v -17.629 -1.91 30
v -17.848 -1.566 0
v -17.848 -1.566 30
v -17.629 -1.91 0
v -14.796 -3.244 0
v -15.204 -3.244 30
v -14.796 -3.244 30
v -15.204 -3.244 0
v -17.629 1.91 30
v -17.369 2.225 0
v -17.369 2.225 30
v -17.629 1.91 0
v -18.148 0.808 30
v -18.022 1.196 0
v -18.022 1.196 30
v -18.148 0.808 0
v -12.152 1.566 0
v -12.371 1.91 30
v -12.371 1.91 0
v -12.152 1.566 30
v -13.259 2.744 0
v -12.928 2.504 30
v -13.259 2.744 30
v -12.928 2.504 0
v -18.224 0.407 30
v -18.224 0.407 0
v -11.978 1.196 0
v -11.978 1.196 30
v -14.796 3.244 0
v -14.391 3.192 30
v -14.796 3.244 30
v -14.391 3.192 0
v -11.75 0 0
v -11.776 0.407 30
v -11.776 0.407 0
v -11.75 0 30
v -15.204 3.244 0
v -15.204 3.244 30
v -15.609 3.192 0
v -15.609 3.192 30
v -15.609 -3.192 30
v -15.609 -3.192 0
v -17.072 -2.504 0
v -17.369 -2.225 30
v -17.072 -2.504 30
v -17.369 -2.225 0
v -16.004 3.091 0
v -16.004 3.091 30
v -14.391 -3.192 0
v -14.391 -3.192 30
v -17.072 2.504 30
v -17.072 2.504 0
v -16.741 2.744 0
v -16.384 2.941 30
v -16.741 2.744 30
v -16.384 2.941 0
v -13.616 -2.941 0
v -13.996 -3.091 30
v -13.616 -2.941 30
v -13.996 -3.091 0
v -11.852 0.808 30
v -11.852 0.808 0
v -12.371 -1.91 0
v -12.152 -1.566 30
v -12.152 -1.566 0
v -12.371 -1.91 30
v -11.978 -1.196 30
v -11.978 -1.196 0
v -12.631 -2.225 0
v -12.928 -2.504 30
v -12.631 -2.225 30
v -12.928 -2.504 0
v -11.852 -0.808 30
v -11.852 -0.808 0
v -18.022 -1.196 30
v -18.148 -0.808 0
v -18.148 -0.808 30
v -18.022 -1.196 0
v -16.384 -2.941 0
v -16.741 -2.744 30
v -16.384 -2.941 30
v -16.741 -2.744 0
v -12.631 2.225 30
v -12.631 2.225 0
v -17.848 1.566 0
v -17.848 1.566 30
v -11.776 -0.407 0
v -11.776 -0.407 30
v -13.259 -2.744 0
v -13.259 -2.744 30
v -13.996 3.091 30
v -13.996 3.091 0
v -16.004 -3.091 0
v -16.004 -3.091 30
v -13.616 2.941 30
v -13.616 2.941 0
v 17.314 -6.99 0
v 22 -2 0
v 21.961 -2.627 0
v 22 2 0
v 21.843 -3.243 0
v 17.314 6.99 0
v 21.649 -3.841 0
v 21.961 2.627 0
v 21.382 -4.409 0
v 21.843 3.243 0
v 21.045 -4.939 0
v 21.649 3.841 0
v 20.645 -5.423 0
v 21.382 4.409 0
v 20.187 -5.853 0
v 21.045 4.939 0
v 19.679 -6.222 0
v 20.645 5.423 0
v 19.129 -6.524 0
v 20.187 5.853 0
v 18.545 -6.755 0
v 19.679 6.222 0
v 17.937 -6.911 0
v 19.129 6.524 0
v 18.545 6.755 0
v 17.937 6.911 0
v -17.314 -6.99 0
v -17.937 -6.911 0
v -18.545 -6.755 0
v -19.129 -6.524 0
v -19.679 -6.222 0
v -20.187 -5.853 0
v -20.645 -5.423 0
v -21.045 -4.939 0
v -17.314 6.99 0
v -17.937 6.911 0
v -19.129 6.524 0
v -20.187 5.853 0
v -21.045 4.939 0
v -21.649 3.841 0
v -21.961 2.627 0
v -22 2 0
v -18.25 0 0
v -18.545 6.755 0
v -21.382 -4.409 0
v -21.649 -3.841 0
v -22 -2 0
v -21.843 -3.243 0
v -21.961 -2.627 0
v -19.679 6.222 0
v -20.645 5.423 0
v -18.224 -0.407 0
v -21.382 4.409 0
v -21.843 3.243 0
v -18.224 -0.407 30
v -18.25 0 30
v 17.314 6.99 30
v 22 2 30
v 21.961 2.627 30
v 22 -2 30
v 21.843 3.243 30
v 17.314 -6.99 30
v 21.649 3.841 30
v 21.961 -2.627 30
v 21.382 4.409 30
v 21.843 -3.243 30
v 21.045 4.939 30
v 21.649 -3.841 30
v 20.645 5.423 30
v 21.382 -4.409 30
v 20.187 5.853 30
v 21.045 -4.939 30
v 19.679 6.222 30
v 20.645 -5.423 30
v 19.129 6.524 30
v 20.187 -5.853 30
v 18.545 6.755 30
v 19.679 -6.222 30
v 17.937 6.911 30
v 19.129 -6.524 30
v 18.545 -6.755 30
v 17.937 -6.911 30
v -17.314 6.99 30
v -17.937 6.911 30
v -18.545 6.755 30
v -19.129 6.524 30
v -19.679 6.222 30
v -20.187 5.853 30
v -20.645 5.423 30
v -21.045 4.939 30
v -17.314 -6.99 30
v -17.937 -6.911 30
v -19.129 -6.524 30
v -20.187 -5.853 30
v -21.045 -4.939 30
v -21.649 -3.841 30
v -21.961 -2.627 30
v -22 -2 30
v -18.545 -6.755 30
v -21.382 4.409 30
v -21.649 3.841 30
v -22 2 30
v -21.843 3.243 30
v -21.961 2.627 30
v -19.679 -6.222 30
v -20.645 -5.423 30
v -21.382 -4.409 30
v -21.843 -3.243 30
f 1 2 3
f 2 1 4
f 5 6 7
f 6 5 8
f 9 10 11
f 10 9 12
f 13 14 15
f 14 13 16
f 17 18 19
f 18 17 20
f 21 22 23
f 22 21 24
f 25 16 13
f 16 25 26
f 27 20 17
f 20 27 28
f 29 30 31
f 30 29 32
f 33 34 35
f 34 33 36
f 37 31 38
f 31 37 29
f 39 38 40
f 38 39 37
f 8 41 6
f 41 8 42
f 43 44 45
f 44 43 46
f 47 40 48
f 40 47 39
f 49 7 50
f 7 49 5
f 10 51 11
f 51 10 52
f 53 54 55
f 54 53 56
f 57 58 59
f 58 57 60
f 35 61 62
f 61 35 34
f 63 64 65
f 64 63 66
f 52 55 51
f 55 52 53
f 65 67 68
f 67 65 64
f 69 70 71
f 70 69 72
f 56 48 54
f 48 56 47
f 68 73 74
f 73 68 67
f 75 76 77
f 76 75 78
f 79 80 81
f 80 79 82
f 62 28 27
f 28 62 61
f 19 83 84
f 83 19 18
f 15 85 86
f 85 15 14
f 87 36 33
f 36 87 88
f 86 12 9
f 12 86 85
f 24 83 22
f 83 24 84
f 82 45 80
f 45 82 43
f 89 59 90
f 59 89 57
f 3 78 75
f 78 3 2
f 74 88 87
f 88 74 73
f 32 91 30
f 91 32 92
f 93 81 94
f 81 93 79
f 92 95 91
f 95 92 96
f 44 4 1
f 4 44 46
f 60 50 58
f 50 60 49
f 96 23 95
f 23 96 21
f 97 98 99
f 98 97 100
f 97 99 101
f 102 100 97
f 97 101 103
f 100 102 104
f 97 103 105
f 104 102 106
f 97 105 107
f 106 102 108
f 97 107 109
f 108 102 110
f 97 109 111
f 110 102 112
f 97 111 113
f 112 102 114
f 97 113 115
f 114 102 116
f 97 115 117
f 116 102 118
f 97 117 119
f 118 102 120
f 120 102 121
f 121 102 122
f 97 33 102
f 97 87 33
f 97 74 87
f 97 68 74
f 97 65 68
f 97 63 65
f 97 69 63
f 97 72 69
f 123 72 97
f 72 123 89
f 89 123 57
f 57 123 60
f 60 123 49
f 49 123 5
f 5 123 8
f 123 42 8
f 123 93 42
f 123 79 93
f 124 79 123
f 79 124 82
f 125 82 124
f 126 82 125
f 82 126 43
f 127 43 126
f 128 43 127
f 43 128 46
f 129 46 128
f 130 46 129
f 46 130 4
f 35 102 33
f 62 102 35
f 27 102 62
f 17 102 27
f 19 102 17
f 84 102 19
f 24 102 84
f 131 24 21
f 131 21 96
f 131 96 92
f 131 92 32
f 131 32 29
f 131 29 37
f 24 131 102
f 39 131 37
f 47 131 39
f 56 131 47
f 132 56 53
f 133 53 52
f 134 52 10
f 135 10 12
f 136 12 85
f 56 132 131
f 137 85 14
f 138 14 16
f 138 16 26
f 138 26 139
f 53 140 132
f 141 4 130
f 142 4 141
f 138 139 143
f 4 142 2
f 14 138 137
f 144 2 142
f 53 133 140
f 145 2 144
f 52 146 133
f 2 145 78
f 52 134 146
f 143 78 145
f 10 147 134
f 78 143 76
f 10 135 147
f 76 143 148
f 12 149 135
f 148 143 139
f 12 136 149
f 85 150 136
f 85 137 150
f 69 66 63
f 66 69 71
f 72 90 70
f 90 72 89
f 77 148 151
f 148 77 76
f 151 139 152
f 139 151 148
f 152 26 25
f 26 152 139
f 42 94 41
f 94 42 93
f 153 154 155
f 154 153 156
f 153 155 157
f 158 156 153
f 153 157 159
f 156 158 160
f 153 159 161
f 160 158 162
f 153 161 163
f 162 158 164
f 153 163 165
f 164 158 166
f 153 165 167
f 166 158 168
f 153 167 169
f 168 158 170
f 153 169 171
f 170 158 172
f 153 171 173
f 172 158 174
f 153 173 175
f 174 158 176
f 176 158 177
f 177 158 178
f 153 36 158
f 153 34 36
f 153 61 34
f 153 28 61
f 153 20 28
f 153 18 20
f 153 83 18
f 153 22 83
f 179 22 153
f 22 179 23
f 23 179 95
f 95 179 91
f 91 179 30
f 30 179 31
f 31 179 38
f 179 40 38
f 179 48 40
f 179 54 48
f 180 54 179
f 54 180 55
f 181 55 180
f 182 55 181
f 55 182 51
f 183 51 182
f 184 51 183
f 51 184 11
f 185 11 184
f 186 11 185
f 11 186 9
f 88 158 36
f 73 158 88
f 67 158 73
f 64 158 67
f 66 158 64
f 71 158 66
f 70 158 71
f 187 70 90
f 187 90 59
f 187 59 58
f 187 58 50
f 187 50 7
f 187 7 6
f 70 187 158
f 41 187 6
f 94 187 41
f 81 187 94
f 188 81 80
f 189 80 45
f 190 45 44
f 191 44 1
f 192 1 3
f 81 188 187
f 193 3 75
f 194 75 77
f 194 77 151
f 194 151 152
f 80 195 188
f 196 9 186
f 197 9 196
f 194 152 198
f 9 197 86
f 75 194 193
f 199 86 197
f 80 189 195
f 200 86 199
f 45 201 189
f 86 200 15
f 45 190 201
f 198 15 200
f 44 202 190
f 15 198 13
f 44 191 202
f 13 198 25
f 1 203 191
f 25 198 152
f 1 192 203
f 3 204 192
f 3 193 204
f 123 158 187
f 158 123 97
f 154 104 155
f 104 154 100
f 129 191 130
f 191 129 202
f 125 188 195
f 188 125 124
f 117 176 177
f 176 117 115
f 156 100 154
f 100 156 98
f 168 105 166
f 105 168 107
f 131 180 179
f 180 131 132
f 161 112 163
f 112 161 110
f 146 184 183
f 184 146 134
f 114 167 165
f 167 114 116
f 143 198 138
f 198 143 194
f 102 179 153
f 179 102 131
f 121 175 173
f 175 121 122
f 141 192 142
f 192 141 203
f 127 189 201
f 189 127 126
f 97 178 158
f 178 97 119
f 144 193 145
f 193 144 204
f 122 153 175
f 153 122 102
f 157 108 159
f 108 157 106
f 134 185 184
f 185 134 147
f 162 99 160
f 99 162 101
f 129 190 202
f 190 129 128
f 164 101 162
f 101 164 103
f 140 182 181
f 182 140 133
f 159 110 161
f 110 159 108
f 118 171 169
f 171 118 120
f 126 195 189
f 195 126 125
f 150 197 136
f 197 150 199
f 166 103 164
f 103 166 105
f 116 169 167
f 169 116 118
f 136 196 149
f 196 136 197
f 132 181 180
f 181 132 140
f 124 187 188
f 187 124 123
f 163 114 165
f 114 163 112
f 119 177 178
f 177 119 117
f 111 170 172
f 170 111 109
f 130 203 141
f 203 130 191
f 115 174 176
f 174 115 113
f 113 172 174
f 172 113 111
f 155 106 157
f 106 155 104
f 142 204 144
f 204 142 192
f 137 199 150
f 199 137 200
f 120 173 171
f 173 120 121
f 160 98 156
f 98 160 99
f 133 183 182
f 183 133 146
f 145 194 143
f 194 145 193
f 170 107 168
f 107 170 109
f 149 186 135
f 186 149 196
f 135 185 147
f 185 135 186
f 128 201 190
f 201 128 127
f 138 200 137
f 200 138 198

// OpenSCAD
$fn = 50;


difference() {
	union() {
		hull() {
			translate(v = [-17.0000000000, 2.0000000000, 0]) {
				cylinder(h = 30, r = 5);
			}
			translate(v = [17.0000000000, 2.0000000000, 0]) {
				cylinder(h = 30, r = 5);
			}
			translate(v = [-17.0000000000, -2.0000000000, 0]) {
				cylinder(h = 30, r = 5);
			}
			translate(v = [17.0000000000, -2.0000000000, 0]) {
				cylinder(h = 30, r = 5);
			}
		}
	}
	union() {
		translate(v = [-15.0000000000, 0.0000000000, 0]) {
			cylinder(h = 30, r = 3.2500000000);
		}
		translate(v = [-15.0000000000, 0.0000000000, 0]) {
			cylinder(h = 30, r = 1.8000000000);
		}
		translate(v = [-15.0000000000, 0.0000000000, 0]) {
			cylinder(h = 30, r = 1.8000000000);
		}
		translate(v = [-15.0000000000, 0.0000000000, 0]) {
			cylinder(h = 30, r = 1.8000000000);
		}
	}
}
